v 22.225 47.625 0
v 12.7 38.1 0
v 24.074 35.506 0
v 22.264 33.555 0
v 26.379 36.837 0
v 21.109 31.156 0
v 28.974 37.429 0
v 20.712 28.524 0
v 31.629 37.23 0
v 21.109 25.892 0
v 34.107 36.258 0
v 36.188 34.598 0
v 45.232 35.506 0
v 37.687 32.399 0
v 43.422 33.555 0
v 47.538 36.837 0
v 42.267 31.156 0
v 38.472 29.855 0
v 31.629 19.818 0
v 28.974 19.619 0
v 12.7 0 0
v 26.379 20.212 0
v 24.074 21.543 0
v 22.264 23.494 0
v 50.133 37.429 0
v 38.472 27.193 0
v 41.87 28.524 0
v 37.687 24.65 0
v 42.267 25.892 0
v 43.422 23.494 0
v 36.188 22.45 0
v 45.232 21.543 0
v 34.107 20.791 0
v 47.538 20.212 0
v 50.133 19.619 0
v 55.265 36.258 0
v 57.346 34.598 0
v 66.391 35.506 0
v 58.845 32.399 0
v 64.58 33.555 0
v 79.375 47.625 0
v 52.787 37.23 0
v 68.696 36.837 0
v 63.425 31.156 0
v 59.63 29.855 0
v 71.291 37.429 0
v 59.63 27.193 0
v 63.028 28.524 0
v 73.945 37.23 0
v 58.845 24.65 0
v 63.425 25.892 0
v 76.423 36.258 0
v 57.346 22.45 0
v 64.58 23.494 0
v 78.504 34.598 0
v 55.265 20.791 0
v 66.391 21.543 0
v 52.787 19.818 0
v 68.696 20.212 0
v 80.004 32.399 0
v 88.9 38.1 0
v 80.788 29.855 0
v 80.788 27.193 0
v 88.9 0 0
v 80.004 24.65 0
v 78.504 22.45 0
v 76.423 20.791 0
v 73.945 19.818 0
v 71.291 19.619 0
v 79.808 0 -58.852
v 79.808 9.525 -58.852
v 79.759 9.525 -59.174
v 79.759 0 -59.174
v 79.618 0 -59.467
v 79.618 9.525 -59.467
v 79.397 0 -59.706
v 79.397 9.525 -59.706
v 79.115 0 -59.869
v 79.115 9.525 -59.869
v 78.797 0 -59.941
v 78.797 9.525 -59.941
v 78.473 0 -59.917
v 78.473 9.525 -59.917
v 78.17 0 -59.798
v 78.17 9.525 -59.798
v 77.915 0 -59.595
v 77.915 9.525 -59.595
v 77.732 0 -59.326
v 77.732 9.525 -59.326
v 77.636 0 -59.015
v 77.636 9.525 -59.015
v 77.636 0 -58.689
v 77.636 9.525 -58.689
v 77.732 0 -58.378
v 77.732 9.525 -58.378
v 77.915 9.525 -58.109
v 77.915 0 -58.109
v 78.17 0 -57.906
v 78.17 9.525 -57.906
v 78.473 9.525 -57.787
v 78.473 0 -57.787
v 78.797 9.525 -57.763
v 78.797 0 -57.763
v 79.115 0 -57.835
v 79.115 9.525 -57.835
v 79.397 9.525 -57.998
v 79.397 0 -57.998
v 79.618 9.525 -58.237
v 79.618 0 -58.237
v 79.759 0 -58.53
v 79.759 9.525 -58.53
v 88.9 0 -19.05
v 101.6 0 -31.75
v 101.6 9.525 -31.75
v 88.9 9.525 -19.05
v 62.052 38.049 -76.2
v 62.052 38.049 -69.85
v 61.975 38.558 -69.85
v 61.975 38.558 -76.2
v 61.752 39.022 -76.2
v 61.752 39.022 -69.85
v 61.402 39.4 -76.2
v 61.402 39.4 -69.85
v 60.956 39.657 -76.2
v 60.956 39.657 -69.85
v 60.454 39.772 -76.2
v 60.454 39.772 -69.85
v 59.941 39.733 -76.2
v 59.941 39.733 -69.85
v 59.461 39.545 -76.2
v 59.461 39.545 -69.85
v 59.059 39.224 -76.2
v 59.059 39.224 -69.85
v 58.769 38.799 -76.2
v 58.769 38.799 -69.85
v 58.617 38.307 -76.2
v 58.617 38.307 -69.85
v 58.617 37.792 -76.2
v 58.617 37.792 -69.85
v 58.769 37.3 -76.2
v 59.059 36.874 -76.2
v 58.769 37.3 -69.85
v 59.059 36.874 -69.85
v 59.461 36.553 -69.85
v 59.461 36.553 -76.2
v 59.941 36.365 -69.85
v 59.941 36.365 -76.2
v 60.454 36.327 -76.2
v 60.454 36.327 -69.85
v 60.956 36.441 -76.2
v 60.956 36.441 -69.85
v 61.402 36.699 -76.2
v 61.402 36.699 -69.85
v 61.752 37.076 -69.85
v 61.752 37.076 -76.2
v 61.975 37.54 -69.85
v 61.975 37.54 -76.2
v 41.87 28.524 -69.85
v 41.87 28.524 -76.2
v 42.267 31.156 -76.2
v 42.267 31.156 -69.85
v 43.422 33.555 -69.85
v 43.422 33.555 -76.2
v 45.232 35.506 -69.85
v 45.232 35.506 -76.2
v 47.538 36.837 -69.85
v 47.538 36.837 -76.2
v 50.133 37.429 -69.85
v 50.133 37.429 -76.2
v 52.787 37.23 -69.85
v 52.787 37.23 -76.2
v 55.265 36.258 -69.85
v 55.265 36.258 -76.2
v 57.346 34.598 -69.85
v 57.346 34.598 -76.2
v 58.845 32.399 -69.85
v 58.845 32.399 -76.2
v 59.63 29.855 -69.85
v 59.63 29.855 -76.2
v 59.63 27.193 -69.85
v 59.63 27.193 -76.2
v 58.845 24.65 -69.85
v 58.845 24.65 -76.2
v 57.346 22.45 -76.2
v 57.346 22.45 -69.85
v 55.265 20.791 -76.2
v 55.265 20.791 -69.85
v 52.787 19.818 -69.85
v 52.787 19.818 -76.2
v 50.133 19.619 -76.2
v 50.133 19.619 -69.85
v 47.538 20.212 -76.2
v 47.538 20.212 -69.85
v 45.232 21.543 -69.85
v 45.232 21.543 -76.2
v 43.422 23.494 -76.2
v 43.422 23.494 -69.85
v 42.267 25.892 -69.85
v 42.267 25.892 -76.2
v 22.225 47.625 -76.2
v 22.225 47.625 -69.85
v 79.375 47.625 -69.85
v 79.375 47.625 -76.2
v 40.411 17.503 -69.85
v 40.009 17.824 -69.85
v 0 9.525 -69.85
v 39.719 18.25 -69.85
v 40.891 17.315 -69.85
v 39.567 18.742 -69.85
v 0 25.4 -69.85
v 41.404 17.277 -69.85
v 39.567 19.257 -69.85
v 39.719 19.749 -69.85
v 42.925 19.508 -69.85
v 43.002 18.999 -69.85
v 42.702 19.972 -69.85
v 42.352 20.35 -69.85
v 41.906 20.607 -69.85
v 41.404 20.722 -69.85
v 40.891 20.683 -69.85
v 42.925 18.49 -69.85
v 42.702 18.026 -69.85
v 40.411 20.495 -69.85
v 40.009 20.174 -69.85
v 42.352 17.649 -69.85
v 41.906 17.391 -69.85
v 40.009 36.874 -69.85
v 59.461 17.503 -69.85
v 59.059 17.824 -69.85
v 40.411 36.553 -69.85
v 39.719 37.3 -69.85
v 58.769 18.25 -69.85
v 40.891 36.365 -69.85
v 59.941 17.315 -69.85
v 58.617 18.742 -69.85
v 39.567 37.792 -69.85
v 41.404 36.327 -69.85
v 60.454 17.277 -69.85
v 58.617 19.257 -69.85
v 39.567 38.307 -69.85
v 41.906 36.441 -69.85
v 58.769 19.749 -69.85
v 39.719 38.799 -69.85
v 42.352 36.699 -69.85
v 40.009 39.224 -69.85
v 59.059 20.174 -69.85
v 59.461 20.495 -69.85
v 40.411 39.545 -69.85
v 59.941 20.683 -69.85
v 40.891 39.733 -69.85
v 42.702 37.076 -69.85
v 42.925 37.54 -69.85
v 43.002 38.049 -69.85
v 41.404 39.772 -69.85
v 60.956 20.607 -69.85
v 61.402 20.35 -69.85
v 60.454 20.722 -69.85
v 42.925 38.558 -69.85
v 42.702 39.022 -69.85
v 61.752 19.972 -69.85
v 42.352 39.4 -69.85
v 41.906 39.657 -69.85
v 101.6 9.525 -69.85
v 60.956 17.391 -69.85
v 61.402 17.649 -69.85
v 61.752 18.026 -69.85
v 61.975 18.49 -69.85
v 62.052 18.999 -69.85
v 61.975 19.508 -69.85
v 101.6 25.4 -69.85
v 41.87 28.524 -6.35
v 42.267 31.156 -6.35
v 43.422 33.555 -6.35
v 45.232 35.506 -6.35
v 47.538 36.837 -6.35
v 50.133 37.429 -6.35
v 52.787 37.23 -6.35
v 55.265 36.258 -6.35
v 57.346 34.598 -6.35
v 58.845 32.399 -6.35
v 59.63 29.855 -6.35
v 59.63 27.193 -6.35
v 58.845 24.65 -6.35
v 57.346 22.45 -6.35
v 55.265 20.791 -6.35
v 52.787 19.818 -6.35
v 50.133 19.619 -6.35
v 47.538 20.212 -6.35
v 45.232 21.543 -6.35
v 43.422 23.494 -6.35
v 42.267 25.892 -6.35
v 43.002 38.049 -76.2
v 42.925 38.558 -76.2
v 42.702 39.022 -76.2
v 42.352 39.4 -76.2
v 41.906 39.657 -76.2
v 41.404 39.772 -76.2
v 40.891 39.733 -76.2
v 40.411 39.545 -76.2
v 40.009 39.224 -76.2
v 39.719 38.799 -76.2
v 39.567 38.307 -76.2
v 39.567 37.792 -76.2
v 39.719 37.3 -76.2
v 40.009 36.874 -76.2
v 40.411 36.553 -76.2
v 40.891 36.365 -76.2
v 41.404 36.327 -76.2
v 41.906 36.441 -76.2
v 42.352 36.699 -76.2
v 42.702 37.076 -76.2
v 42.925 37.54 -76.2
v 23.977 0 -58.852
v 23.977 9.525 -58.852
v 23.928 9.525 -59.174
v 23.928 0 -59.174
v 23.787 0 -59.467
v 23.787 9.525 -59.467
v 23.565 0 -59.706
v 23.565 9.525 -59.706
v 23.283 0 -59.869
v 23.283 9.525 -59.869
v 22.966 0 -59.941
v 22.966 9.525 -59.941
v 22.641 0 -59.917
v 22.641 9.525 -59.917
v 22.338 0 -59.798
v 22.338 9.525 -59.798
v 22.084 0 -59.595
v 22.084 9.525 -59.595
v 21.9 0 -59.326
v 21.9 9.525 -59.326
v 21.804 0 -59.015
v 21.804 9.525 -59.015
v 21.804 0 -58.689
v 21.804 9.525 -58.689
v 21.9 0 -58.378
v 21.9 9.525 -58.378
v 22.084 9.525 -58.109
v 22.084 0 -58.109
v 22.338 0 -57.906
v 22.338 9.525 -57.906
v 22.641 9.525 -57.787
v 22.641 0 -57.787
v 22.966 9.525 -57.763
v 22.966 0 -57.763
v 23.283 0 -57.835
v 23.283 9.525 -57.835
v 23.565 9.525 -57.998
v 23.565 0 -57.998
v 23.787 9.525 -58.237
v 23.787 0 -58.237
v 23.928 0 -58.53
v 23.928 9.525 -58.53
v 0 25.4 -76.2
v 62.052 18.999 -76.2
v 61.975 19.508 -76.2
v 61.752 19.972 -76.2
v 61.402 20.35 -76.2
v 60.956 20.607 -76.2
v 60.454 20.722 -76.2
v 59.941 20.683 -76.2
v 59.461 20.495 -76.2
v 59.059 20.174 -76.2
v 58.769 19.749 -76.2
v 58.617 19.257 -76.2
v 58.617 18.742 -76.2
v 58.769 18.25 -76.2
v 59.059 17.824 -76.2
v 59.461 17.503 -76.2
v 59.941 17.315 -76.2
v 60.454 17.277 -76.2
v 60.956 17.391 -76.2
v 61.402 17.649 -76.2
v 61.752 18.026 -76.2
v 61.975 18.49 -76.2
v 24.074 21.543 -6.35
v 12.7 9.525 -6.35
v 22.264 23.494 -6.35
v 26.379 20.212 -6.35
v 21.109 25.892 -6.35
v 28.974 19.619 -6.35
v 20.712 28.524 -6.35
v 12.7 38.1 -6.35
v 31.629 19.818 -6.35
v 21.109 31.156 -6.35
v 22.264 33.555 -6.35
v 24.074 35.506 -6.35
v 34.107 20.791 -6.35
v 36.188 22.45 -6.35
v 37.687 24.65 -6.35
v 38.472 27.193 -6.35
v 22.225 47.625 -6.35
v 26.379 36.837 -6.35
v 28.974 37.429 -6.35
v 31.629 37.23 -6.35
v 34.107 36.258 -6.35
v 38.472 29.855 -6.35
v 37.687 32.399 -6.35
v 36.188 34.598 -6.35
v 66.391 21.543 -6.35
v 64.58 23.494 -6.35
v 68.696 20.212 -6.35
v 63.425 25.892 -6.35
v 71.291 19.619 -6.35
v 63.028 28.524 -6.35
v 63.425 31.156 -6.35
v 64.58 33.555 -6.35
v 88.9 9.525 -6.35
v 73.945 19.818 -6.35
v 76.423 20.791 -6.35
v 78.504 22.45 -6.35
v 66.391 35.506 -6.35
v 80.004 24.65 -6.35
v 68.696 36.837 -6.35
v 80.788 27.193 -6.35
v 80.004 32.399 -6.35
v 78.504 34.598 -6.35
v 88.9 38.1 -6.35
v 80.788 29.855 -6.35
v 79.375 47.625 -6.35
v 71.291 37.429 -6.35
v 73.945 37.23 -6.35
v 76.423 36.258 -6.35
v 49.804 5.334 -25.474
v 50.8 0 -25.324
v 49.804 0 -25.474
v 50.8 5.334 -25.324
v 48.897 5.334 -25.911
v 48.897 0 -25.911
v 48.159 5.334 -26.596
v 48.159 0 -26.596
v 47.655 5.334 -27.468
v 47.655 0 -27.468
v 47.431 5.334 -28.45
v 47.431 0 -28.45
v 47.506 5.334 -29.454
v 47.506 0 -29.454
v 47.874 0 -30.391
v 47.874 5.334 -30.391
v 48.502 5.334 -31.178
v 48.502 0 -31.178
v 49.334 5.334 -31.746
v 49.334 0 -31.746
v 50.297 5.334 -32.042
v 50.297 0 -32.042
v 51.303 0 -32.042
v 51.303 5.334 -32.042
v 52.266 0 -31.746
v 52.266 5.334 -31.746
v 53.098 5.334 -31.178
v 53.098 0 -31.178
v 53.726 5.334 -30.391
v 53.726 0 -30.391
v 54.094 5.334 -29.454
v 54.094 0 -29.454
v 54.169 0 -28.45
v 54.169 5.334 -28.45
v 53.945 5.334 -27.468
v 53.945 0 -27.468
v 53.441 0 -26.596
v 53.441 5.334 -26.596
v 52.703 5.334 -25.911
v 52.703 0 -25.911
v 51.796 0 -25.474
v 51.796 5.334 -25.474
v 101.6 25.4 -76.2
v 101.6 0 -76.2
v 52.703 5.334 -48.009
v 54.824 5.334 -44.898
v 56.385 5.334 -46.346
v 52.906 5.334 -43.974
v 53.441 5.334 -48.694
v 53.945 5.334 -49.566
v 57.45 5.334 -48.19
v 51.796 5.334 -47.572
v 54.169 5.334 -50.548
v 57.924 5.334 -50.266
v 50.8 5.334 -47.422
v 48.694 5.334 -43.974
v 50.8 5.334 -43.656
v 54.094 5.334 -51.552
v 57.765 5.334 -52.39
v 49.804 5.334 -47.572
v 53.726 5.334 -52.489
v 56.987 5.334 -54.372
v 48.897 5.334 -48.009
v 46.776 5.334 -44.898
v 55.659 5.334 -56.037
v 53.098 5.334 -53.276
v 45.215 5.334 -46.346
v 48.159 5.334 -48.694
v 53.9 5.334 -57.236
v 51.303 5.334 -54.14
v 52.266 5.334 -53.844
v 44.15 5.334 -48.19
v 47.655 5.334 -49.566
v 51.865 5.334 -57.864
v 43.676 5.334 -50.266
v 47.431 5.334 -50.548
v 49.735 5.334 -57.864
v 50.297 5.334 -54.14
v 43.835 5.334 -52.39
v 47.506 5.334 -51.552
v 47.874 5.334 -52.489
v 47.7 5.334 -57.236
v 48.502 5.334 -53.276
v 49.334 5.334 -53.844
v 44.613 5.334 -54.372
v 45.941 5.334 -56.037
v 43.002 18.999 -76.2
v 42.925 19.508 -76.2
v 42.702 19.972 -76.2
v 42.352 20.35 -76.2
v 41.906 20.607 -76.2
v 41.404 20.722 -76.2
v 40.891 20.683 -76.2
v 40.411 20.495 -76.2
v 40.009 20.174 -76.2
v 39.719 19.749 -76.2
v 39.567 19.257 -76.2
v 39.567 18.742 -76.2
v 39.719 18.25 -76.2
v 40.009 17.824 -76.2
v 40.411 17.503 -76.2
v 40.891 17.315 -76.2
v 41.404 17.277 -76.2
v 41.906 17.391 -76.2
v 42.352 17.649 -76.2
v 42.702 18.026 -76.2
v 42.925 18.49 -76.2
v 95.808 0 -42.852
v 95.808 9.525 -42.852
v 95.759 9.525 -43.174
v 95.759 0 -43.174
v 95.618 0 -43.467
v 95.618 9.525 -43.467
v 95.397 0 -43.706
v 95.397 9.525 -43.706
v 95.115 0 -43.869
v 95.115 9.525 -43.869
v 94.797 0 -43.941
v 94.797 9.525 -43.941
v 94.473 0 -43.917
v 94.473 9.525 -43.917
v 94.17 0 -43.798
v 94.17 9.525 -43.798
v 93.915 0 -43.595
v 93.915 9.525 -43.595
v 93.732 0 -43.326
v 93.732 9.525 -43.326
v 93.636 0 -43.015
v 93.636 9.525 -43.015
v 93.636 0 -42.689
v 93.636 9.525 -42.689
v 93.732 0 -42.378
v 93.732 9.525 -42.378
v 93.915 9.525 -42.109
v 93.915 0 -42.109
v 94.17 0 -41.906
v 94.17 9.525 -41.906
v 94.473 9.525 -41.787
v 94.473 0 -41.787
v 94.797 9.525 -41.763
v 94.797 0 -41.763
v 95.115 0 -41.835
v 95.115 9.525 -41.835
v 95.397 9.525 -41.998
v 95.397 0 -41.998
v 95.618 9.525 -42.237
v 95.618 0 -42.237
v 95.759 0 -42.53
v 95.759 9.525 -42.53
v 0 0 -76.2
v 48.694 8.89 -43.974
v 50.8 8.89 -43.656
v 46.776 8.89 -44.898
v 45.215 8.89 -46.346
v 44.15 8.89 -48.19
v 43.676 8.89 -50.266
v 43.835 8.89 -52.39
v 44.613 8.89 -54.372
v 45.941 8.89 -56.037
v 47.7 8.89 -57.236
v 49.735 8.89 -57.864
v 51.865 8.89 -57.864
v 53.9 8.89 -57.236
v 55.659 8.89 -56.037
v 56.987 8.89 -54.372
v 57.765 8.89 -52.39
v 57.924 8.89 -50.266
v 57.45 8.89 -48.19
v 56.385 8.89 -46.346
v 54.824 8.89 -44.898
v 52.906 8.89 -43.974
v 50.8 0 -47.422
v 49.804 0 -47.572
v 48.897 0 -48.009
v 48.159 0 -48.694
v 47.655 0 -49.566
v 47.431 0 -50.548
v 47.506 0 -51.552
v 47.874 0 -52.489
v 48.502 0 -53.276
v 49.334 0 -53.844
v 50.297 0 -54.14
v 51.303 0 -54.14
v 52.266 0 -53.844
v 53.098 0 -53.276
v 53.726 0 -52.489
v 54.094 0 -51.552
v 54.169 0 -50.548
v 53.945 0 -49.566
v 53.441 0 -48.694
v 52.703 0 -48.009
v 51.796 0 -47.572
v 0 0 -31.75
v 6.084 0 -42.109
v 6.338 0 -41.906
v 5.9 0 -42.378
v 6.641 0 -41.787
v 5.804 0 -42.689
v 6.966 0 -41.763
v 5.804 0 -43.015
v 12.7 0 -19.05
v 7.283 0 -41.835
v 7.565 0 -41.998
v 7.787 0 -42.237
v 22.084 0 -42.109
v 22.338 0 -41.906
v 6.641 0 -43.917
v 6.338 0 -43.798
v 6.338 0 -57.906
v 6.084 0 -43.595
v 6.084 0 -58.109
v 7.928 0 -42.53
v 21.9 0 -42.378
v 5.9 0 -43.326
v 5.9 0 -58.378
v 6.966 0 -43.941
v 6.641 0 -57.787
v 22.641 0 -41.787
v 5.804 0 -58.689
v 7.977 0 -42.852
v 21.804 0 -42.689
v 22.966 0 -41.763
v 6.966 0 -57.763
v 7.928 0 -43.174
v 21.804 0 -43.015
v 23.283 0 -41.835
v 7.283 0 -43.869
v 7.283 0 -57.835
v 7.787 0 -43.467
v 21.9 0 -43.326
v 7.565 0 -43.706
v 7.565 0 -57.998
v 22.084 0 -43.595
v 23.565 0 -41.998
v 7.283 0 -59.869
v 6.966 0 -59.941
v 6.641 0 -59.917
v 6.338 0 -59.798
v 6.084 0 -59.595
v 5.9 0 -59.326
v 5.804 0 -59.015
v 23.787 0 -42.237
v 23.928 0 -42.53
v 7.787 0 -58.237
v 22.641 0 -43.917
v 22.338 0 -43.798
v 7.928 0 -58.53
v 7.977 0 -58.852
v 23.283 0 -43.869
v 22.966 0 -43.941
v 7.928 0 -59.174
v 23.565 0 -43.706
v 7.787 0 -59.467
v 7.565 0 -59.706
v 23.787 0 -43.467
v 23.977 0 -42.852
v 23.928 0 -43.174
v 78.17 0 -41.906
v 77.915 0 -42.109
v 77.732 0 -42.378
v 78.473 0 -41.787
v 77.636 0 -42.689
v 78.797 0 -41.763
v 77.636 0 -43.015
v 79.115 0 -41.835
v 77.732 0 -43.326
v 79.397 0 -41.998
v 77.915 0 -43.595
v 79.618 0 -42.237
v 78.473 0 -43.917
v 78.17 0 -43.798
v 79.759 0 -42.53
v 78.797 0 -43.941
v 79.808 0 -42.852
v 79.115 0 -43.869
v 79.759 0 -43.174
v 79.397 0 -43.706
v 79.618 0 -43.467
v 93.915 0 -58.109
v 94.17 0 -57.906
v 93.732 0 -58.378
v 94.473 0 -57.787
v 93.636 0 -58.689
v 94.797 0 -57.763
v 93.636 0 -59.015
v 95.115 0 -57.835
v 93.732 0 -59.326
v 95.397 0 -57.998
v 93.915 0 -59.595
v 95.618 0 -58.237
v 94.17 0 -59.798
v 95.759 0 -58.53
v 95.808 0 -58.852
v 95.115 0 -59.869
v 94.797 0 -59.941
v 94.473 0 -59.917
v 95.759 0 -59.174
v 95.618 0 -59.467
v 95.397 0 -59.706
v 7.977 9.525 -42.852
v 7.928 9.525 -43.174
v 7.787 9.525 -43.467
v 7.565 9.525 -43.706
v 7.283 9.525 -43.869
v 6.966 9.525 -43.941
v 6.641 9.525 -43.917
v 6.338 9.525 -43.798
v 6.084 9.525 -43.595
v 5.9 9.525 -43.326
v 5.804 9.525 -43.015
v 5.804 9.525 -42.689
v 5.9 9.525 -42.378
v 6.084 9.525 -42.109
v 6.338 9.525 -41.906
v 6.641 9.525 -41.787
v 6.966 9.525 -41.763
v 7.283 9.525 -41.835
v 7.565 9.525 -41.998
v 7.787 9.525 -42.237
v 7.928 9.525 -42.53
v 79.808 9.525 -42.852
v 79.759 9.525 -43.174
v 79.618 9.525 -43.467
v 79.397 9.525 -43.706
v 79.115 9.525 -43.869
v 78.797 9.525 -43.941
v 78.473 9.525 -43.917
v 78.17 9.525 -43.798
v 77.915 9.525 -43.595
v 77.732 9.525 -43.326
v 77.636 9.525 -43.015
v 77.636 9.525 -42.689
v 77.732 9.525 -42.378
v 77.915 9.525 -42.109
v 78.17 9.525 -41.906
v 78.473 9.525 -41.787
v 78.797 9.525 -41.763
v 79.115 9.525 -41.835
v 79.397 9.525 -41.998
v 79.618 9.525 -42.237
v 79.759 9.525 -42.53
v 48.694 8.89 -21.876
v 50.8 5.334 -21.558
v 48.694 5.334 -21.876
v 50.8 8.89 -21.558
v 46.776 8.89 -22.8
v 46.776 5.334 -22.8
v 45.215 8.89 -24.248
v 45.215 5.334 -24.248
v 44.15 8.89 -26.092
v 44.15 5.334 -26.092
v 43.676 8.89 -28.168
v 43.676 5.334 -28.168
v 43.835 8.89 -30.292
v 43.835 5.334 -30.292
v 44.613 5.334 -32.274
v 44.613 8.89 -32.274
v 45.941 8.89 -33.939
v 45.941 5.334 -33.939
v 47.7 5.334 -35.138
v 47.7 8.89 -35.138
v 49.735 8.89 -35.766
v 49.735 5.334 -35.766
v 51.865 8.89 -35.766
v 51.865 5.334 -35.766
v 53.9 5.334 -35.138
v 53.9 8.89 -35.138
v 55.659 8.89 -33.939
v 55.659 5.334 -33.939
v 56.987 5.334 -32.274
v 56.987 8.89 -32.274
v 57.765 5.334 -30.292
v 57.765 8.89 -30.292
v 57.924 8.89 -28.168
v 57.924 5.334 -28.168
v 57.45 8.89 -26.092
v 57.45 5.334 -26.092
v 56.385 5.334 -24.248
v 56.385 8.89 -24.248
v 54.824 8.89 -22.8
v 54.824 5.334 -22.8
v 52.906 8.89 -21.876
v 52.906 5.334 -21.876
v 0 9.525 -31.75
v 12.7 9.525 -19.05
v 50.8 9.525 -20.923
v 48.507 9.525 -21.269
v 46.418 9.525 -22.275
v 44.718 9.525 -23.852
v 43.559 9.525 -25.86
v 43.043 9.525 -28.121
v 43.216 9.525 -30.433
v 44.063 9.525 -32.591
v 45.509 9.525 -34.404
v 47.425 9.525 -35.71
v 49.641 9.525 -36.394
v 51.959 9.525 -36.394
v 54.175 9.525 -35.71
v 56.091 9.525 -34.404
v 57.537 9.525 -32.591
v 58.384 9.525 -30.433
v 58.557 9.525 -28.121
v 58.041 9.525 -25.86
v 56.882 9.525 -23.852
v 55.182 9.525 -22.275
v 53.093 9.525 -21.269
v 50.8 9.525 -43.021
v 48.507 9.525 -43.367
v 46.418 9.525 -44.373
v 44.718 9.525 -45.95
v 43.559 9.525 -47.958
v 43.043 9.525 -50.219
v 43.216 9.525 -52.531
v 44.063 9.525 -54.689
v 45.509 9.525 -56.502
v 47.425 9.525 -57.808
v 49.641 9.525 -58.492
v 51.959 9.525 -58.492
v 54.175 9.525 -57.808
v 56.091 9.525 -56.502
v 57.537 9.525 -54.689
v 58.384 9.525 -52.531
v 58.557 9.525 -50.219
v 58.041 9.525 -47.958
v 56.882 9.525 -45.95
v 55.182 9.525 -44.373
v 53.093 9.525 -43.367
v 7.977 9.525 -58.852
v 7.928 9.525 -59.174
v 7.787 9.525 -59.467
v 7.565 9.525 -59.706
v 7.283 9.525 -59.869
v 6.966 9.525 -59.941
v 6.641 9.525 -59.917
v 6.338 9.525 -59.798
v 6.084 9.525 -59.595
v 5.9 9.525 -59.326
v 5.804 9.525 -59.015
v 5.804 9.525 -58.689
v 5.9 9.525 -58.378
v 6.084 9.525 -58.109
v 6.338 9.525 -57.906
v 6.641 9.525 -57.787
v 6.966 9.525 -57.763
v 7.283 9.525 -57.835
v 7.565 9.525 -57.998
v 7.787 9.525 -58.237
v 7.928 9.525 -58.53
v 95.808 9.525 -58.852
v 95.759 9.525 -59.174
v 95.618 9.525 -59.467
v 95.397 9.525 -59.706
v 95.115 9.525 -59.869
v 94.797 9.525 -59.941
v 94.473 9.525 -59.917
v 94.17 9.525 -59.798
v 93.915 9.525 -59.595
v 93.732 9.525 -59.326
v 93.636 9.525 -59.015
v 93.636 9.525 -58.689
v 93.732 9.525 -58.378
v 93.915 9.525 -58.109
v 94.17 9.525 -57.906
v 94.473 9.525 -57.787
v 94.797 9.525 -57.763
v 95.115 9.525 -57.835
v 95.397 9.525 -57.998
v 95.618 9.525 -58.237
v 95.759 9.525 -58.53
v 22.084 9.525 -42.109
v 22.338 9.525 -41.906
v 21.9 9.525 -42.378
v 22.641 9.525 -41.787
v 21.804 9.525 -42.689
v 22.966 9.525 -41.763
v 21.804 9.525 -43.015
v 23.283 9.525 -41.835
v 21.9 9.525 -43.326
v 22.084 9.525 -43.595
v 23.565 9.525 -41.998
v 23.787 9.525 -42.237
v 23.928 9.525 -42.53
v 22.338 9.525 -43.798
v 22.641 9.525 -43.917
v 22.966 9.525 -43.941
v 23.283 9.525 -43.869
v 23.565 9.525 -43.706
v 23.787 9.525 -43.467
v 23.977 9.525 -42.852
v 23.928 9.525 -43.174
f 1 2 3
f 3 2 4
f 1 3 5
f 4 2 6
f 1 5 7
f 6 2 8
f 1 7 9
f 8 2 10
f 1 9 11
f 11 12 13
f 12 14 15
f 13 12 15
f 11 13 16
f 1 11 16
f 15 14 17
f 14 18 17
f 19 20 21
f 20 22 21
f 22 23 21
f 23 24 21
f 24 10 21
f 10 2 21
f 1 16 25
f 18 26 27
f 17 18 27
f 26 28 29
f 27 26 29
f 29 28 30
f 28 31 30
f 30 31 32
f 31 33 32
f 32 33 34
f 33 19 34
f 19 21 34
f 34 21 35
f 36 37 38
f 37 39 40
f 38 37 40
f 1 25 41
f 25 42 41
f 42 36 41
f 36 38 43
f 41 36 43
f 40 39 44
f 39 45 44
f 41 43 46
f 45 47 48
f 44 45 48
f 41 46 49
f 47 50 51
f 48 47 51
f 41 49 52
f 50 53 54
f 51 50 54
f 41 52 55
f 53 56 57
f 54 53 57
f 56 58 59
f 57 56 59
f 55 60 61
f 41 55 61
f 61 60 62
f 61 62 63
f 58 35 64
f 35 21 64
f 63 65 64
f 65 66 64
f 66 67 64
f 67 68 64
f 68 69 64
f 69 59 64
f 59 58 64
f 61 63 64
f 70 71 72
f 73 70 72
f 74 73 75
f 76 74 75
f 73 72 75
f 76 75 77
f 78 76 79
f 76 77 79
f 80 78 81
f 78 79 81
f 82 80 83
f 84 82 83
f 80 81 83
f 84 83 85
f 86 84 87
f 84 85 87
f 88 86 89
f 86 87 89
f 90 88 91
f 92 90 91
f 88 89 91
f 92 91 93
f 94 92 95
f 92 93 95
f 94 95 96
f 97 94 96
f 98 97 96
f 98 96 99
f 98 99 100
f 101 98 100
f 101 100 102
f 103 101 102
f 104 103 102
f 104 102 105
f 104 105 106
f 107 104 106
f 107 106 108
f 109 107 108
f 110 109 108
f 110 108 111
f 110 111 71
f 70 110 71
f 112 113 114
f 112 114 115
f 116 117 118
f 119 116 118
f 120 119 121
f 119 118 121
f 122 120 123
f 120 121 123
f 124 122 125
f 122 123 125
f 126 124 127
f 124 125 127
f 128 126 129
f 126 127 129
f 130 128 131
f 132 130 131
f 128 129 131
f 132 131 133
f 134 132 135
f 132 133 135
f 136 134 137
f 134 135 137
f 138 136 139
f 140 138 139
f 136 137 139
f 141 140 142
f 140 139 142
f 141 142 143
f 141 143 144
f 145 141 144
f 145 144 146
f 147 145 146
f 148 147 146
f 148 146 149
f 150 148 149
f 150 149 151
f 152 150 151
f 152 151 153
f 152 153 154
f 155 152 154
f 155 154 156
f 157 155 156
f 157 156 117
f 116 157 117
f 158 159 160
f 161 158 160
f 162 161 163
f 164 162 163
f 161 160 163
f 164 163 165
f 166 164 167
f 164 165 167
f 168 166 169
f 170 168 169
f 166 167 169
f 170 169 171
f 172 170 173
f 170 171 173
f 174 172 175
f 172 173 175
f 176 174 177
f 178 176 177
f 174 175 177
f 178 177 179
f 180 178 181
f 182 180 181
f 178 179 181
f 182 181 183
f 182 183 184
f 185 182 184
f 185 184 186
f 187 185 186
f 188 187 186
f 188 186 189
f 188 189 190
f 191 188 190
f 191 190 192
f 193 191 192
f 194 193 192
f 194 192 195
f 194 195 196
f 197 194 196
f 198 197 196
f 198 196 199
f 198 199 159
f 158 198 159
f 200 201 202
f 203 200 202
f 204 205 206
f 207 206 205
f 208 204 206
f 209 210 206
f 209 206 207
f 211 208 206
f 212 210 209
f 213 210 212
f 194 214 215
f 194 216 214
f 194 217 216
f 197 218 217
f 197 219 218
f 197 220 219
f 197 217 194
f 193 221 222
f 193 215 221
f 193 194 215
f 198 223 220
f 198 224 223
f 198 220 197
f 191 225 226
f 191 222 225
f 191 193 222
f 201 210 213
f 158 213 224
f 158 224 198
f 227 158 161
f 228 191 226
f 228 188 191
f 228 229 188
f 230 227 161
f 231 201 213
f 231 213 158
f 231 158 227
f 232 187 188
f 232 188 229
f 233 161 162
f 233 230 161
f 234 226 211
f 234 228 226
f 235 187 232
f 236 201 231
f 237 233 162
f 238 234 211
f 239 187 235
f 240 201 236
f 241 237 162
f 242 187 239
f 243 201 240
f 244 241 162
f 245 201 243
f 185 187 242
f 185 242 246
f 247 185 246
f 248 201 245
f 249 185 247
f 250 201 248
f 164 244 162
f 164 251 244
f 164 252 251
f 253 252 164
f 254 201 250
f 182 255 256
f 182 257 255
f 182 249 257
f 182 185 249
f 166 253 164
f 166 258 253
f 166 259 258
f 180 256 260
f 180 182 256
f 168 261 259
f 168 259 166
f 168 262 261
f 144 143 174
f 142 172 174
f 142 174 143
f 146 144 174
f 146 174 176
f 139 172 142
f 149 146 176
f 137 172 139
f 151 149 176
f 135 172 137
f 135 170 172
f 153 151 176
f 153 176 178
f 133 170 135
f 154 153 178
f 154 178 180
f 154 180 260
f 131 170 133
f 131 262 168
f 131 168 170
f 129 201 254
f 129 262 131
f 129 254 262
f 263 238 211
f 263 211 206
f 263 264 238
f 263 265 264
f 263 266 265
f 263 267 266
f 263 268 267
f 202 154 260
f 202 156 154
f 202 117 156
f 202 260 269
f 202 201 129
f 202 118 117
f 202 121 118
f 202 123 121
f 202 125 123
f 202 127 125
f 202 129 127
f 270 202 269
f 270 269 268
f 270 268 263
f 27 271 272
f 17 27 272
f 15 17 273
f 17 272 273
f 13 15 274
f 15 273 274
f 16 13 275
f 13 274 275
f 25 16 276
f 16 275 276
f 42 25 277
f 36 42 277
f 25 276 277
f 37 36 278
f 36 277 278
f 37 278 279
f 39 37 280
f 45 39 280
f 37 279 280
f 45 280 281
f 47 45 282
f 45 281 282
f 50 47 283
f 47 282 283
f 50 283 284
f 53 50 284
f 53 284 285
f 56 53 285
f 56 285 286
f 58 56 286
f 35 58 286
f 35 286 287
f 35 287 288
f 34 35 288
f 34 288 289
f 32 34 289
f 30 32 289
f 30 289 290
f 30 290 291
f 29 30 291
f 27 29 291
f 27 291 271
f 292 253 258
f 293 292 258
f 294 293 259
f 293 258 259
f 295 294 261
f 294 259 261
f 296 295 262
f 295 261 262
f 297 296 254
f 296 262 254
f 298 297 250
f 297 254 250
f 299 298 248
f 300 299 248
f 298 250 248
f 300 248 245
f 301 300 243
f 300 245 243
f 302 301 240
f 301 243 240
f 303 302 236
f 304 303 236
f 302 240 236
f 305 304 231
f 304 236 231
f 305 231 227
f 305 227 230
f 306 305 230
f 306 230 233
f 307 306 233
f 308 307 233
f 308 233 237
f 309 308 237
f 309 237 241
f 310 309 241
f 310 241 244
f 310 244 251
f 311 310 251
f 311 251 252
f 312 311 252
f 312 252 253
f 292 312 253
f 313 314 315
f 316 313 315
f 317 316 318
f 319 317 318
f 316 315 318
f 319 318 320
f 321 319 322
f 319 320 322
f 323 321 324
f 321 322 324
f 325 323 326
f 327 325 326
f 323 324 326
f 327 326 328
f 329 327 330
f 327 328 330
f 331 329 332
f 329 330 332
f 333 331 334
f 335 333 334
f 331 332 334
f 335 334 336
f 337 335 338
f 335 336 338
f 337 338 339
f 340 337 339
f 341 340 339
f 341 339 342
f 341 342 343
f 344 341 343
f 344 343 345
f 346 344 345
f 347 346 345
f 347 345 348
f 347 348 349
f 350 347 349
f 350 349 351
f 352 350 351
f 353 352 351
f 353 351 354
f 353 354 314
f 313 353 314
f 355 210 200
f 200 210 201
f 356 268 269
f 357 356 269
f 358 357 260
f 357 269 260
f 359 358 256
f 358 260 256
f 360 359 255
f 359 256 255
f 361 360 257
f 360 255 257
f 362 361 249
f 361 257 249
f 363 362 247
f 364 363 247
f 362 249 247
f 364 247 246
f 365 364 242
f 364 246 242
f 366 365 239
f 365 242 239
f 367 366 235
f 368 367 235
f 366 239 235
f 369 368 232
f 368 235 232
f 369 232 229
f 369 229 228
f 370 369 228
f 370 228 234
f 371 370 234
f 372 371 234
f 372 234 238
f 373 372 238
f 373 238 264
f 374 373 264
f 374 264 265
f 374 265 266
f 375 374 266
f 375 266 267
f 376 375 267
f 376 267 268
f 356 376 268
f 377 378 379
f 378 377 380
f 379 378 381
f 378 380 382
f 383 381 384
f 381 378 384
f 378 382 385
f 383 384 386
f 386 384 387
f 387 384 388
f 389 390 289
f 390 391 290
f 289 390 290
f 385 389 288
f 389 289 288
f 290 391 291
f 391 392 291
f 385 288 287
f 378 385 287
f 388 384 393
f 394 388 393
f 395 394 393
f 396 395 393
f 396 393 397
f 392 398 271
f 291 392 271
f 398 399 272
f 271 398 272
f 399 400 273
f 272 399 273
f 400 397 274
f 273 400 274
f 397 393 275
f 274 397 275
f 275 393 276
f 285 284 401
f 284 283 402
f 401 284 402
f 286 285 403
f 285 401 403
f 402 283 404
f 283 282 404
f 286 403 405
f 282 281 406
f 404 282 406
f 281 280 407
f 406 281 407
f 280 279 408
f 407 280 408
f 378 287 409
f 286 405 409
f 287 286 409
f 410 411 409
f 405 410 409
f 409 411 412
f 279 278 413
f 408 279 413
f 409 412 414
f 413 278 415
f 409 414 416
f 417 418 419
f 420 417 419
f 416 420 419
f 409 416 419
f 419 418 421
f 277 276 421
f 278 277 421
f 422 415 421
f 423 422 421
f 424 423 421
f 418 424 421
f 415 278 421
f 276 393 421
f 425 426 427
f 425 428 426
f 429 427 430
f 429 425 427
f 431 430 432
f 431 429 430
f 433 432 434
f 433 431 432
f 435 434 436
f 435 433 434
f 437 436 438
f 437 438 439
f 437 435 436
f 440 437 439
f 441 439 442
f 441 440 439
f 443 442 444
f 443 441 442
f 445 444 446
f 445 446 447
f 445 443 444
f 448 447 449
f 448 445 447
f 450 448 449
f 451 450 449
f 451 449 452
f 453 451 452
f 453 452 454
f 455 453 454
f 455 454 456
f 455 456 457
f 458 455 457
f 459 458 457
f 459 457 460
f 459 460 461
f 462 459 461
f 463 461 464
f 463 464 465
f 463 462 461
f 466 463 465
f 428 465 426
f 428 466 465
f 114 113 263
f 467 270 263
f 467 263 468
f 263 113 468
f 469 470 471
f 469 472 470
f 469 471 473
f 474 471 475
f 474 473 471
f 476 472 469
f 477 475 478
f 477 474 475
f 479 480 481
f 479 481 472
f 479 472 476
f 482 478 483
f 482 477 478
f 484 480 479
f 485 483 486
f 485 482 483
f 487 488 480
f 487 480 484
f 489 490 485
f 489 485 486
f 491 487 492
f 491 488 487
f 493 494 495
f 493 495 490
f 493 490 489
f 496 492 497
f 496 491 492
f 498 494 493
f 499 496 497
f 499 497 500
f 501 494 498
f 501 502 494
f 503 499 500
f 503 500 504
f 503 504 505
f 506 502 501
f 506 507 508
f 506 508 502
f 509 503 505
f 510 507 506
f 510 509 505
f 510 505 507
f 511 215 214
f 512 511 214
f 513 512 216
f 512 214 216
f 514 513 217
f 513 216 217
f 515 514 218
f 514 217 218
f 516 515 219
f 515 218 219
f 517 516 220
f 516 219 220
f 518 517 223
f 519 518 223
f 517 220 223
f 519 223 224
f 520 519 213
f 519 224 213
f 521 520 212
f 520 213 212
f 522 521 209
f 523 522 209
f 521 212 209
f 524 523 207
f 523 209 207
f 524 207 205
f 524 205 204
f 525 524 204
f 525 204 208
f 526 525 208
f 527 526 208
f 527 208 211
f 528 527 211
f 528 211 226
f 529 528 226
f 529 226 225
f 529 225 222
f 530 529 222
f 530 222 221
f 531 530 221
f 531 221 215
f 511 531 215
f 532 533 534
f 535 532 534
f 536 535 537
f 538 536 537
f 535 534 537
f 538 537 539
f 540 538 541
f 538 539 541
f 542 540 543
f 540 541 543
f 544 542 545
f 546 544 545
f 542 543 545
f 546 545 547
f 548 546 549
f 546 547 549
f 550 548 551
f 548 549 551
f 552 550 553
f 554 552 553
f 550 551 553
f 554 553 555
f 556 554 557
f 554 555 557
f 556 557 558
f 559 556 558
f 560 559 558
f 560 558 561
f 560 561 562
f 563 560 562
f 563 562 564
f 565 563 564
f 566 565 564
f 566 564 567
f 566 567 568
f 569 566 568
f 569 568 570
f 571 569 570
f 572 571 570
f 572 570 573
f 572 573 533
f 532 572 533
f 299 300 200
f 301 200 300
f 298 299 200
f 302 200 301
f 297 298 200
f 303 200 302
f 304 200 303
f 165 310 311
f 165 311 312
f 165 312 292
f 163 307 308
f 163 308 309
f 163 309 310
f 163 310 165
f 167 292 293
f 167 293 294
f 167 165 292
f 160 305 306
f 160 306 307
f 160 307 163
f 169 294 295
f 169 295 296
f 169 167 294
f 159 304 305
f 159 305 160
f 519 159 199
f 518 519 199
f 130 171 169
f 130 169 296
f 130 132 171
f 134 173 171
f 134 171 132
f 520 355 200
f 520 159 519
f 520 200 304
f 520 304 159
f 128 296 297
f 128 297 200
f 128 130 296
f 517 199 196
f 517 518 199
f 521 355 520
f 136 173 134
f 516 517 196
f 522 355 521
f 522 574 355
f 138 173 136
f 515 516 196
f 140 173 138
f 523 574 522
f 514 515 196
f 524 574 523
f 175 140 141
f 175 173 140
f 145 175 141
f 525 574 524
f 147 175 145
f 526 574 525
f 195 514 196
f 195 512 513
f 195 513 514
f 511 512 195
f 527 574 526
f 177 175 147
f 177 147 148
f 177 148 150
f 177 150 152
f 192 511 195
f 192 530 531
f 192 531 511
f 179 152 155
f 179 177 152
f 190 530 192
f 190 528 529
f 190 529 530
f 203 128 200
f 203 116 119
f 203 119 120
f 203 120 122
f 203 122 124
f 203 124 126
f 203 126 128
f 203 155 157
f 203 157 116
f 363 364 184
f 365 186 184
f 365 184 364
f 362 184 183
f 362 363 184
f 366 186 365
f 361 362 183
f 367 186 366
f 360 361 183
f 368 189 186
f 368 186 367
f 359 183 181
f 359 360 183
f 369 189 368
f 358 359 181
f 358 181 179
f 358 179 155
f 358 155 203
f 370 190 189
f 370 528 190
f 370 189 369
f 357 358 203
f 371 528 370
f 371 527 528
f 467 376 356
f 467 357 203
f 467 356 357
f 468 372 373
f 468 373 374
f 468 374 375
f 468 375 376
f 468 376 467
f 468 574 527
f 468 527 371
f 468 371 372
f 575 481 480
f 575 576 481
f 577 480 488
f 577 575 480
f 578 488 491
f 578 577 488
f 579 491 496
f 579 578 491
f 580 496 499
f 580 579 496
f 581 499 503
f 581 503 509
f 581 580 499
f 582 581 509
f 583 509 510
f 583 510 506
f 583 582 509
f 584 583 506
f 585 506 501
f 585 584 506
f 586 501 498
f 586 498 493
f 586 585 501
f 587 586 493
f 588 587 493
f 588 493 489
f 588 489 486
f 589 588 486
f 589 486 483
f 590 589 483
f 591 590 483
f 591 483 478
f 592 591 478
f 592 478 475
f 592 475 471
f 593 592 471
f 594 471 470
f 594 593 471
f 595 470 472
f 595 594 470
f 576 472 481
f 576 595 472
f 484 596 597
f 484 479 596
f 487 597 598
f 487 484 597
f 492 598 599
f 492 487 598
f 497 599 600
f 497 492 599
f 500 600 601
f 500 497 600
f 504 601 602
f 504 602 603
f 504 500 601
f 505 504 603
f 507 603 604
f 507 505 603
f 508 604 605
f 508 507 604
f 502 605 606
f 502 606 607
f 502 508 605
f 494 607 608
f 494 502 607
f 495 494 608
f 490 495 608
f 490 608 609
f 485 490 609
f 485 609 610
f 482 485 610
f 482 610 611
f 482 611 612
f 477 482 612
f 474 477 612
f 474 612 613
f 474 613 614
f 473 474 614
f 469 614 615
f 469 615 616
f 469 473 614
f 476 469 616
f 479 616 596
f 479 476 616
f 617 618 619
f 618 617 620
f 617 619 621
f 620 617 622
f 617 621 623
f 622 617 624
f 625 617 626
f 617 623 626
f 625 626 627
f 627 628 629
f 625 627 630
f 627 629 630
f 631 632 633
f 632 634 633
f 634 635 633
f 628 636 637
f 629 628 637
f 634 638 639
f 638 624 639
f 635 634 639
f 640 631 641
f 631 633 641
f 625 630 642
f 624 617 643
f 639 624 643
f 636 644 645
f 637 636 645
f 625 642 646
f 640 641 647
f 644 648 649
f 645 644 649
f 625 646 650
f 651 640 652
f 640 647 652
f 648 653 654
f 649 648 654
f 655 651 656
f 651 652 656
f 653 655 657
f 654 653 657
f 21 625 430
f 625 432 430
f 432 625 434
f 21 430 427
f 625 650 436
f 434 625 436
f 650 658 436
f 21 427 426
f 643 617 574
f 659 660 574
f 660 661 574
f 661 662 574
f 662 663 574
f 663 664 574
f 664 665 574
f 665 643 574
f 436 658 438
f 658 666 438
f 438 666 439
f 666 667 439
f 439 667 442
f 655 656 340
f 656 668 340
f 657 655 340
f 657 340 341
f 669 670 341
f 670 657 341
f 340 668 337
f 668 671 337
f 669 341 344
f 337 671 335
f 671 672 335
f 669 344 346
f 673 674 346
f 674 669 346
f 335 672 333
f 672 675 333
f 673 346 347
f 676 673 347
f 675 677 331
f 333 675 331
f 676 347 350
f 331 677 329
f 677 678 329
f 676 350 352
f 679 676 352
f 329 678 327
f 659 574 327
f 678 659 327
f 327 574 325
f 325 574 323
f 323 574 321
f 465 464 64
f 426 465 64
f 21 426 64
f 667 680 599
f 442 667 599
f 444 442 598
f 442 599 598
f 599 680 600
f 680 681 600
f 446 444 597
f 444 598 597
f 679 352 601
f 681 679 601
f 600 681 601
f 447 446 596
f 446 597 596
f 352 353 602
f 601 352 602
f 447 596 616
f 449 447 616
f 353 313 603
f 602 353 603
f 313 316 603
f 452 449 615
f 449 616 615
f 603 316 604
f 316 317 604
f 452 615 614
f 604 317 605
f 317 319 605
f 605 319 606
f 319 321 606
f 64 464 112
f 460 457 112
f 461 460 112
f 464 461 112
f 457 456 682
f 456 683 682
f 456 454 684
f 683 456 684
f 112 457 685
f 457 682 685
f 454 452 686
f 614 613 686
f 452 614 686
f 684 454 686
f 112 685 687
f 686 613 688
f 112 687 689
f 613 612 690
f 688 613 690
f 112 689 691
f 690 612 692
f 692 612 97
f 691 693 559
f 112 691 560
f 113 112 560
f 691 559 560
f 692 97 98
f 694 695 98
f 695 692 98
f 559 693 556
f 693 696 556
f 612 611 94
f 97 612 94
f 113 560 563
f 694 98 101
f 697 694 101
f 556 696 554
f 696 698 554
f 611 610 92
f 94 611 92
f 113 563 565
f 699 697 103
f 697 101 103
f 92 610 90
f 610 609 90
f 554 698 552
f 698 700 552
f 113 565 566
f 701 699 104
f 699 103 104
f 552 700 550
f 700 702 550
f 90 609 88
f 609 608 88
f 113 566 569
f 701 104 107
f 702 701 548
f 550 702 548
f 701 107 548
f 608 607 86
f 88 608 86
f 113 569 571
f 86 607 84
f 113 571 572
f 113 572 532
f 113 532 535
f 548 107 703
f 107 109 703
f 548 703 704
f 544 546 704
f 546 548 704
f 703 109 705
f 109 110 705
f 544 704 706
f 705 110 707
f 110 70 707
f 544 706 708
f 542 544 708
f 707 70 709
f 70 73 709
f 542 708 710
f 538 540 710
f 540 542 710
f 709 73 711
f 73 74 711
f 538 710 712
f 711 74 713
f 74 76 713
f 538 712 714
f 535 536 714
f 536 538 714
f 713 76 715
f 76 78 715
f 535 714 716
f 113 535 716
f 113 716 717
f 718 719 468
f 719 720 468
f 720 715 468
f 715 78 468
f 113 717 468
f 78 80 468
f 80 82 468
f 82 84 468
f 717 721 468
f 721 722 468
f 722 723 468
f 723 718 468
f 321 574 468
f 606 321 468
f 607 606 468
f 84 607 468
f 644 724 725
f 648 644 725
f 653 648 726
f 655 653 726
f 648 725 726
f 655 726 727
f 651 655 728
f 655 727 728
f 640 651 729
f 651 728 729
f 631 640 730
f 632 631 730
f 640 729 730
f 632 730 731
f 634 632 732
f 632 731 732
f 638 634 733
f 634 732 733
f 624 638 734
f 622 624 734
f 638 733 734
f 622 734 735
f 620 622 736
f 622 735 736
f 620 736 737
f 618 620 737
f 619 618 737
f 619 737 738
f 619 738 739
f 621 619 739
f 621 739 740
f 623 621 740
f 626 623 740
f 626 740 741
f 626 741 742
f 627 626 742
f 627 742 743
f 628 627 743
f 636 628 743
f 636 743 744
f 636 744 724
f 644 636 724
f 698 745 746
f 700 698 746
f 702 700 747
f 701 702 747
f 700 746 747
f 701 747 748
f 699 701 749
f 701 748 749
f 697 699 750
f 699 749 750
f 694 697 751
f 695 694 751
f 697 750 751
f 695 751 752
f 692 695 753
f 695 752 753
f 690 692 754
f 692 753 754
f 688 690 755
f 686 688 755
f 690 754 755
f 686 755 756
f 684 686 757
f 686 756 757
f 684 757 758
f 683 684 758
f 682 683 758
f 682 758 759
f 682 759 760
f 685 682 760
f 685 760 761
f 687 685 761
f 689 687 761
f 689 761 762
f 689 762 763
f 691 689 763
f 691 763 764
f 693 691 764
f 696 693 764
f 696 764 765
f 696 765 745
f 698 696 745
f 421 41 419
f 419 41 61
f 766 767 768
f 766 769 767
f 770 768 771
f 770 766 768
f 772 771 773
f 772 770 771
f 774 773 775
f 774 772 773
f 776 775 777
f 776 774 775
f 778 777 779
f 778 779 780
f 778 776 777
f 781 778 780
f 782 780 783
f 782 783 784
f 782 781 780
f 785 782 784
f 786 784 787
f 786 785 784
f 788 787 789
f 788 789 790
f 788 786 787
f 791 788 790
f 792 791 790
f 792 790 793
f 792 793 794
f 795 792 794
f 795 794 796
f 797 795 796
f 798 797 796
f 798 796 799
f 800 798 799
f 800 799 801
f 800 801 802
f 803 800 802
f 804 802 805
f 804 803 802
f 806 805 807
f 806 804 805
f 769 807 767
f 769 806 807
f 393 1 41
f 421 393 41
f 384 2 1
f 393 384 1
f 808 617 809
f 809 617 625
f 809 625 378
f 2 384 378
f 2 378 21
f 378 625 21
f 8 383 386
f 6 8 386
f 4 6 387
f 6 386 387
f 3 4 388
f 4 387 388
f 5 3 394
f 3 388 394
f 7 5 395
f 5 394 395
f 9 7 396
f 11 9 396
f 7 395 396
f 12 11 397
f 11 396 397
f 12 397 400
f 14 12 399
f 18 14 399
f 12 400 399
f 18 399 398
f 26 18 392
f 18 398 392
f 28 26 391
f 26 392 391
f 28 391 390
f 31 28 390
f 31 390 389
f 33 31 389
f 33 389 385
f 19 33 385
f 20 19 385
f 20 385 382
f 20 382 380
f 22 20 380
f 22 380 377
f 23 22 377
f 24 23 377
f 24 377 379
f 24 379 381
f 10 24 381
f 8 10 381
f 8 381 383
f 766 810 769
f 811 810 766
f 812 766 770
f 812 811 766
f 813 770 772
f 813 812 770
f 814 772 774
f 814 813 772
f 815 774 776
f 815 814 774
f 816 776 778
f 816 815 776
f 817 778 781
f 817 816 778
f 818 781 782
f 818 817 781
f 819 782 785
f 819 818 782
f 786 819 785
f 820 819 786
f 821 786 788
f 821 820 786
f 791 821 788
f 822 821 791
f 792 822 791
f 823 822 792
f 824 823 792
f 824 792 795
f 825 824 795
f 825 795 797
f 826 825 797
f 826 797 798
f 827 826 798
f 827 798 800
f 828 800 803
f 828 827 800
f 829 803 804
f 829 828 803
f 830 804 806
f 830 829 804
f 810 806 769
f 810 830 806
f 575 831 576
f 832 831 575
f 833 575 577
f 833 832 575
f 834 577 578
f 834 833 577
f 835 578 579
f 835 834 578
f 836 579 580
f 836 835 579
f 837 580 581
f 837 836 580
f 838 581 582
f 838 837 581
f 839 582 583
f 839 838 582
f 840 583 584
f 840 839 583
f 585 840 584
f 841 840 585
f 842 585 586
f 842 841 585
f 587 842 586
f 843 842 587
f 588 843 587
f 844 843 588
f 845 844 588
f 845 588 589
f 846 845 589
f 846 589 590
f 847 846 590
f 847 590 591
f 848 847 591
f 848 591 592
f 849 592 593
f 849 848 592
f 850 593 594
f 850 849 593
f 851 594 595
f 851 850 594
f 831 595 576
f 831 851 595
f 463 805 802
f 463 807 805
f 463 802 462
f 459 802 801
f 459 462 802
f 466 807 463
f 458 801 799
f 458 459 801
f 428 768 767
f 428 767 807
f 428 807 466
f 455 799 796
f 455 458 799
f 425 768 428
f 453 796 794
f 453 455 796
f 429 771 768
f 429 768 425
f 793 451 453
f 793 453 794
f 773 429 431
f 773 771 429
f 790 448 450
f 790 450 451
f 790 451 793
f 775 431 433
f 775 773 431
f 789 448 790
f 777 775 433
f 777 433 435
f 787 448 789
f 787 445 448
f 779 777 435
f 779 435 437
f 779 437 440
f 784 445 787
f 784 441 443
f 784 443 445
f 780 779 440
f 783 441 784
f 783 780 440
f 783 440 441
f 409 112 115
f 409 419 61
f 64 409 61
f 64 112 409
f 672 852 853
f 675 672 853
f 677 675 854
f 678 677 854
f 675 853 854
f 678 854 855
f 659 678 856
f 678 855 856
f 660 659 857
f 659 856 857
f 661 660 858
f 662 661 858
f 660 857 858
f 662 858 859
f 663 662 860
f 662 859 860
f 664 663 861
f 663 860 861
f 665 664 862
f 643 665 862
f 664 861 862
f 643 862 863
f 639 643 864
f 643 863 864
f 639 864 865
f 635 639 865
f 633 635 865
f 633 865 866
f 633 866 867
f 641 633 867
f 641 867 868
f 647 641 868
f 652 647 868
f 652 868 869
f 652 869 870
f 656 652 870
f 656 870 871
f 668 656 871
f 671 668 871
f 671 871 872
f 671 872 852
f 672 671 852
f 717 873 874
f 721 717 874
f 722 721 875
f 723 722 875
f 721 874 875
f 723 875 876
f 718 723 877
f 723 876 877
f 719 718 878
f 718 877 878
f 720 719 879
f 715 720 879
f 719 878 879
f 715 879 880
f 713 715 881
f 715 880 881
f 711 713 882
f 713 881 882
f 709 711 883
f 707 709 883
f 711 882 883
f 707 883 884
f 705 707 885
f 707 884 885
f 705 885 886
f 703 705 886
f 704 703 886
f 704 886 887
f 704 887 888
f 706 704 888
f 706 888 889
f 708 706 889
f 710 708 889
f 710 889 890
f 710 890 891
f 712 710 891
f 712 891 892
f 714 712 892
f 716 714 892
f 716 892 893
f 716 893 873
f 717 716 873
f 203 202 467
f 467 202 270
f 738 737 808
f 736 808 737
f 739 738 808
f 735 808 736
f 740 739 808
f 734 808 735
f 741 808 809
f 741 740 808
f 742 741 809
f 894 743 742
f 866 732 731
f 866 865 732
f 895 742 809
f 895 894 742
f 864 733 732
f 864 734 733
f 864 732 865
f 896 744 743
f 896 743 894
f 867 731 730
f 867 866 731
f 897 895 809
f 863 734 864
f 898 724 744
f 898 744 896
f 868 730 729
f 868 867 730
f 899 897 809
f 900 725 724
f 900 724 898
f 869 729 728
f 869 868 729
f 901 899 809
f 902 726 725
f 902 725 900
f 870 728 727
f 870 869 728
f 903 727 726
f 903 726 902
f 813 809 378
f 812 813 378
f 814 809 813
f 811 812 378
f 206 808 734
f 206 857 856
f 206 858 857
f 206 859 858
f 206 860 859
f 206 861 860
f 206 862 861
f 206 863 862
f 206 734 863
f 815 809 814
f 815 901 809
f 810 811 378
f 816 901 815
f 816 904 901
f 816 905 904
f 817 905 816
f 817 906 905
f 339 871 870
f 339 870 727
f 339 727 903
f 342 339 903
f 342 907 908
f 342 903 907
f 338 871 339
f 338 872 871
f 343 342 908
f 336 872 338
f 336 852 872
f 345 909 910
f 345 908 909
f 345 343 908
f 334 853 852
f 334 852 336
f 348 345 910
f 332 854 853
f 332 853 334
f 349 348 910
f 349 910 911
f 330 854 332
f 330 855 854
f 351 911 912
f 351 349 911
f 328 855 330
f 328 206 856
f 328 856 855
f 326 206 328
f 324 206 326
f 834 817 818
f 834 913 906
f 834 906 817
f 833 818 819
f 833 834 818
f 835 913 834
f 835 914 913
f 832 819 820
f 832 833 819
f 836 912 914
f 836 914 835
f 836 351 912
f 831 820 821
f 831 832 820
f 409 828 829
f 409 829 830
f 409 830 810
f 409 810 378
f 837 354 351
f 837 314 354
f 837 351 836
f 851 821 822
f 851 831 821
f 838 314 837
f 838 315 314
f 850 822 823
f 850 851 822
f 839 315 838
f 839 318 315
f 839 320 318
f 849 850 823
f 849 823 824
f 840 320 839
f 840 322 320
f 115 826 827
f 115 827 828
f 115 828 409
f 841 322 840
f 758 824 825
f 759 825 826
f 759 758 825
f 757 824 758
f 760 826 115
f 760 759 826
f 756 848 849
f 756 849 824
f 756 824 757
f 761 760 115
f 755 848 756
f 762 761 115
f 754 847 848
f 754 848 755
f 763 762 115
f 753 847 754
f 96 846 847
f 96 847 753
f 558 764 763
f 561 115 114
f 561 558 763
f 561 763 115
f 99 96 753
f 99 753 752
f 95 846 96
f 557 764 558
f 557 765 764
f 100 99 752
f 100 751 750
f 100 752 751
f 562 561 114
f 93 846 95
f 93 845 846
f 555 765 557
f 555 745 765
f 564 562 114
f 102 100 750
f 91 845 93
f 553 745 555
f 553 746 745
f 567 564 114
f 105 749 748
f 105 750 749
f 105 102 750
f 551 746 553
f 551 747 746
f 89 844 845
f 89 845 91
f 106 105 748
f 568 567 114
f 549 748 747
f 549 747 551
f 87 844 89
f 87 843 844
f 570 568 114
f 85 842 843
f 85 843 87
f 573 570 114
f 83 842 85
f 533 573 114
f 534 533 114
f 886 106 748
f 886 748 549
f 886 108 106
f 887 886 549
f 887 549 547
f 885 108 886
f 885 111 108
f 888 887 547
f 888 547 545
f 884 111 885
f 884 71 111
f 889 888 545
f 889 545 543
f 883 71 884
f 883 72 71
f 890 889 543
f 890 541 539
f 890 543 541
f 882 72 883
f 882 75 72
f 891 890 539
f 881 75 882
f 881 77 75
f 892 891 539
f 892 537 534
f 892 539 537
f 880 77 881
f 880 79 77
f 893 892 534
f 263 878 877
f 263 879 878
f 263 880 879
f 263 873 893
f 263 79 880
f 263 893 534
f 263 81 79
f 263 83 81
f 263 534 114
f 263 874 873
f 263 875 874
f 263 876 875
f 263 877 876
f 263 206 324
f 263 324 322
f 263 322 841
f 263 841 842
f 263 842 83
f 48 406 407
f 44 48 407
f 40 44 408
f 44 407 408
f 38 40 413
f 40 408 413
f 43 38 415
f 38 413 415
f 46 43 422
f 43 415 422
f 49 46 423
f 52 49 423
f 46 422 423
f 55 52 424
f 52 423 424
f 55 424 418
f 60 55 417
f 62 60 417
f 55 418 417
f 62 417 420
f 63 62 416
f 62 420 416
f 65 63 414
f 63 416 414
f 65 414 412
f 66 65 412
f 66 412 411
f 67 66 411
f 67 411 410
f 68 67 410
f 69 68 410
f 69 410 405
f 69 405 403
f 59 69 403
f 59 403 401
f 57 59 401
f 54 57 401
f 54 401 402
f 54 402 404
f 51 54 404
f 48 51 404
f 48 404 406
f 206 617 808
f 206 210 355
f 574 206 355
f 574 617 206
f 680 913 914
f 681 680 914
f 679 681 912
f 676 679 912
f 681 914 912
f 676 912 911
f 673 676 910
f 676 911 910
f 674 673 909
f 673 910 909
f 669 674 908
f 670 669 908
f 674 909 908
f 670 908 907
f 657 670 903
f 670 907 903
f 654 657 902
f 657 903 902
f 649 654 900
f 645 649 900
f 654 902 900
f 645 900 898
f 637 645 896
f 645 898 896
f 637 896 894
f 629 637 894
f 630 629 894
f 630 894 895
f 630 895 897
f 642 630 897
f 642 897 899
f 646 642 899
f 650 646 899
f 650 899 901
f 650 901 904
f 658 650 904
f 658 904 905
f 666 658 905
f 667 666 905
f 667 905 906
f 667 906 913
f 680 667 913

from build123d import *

# Parameters (mm, degrees)
SKETCH1_W                                    = 101.6
SKETCH1_H                                    = 76.2
BOSS_EXTRUDE1_DEPTH                          = 50.8
CUT_EXTRUDE1_DEPTH                           = 31.75
CUT_EXTRUDE1_DEPTH_BACK                      = 31.75
SKETCH9_W                                    = 101.6
SKETCH9_H                                    = 41.275
F_45_64_0_70313_DIAMETER_HOLE1_D             = 17.859502
F_45_64_0_70313_DIAMETER_HOLE2_D             = 17.859502
F_45_64_0_70313_DIAMETER_HOLE2_DEPTH         = 25.4
F_45_64_0_70313_DIAMETER_HOLE2_TIP           = 5.365535714
CBORE_FOR_1_4_BINDING_HEAD_MACHINE_S_2_COUNT = 2
CBORE_FOR_1_4_BINDING_HEAD_MACHINE_S_2_PITCH = 22.098
CUT_EXTRUDE3_DEPTH                           = 137.783186101
F_8_32_TAPPED_HOLE1_D                        = 3.4544
F_8_32_TAPPED_HOLE1_DEPTH                    = 6.35
CUT_EXTRUDE4_DEPTH                           = 136.636059457
F_44_0_086_DIAMETER_HOLE1_D                  = 2.1844


with BuildPart() as part:
    # Sketch1 → Boss-Extrude1 (new body)
    with BuildSketch(Plane(origin=(0, 0, 0), x_dir=(1, 0, 0), z_dir=(0, 1, 0))):
        with Locations((50.8, 38.1)):
            Rectangle(SKETCH1_W, SKETCH1_H)
    extrude(amount=BOSS_EXTRUDE1_DEPTH)

    # Sketch9 → Cut-Extrude1 (cut, two sides: drawn at the far end of the back side and taken through both)
    with BuildSketch(Plane.XY.offset(-38.1).offset(-CUT_EXTRUDE1_DEPTH_BACK)):
        with Locations((50.8, 30.1625)):
            Rectangle(SKETCH9_W, SKETCH9_H)
    extrude(amount=CUT_EXTRUDE1_DEPTH + CUT_EXTRUDE1_DEPTH_BACK, mode=Mode.SUBTRACT)

    # 45/64 (0.70313) Diameter Hole1 (through all)
    with Locations(Plane.XY):
        with Locations((50.8, 28.5242)):
            Hole(F_45_64_0_70313_DIAMETER_HOLE1_D / 2)

    # 45/64 (0.70313) Diameter Hole2
    with Locations(Plane.XY):
        with Locations((29.6418, 28.5242), (71.9582, 28.5242)):
            Hole(F_45_64_0_70313_DIAMETER_HOLE2_D / 2, depth=F_45_64_0_70313_DIAMETER_HOLE2_DEPTH)
            with Locations((0, 0, -(F_45_64_0_70313_DIAMETER_HOLE2_DEPTH + F_45_64_0_70313_DIAMETER_HOLE2_TIP / 2))):  # 118° drill point
                Cone(0, F_45_64_0_70313_DIAMETER_HOLE2_D / 2, F_45_64_0_70313_DIAMETER_HOLE2_TIP, mode=Mode.SUBTRACT)

    # Sketch14 → CBORE for 1/4 Binding Head Machine Screw1 (revolve, cut)
    with BuildSketch(Plane(origin=(50.8, 9.525, -50.8), x_dir=(0, 0, 1), z_dir=(1, 0, 0))):
        Polygon((0, 0), (0, 9.525), (3.3782, 9.525), (3.3782, 4.191), (7.14375, 4.191), (7.14375, 0.635), (7.77875, 0), align=None)
    cbore_for_1_4_binding_head_machine_screw = revolve(axis=Axis((50.8, 15.875, -50.8), (0, -1, 0)), mode=Mode.SUBTRACT)

    # CBORE for 1_4 Binding Head Machine S 2: CBORE for 1/4 Binding Head Machine Screw1 ×2
    with Locations(*[(0, 0, i * CBORE_FOR_1_4_BINDING_HEAD_MACHINE_S_2_PITCH) for i in range(1, CBORE_FOR_1_4_BINDING_HEAD_MACHINE_S_2_COUNT)]):
        add(cbore_for_1_4_binding_head_machine_screw, mode=Mode.SUBTRACT)

    # Sketch17 → Cut-Extrude3 (cut, through all)
    with BuildSketch(Plane.XY):
        Polygon((0, 25.4), (22.225, 47.625), (79.375, 47.625), (101.6, 25.4), (101.6, 50.8), (0, 50.8), align=None)
    extrude(amount=-CUT_EXTRUDE3_DEPTH, mode=Mode.SUBTRACT)

    # #8-32 Tapped Hole1
    with Locations(Plane(origin=(0, 0, -76.2), x_dir=(-1, 0, 0), z_dir=(0, 0, -1))):
        with Locations((-41.275, 38.0492), (-60.325, 18.9992), (-60.325, 38.0492), (-41.275, 18.9992)):
            Hole(F_8_32_TAPPED_HOLE1_D / 2, depth=F_8_32_TAPPED_HOLE1_DEPTH)

    # Sketch21 → Cut-Extrude4 (cut, through all)
    with BuildSketch(Plane.XZ):
        Polygon((0, 0), (0, -31.75), (12.7, -19.05), (12.7, 0), align=None)
        Polygon((88.9, 0), (101.6, 0), (101.6, -31.75), (88.9, -19.05), align=None)
    extrude(amount=-CUT_EXTRUDE4_DEPTH, mode=Mode.SUBTRACT)

    # #44 (0.086) Diameter Hole1 (through all)
    with Locations(Plane(origin=(0, 0, 0), x_dir=(-1, 0, 0), z_dir=(0, -1, 0))):
        with Locations((-22.8844, 58.8518), (-6.8844, 58.8518), (-22.8844, 42.8518), (-6.8844, 42.8518), (-78.7156, 58.8518), (-94.7156, 58.8518), (-78.7156, 42.8518), (-94.7156, 42.8518)):
            Hole(F_44_0_086_DIAMETER_HOLE1_D / 2)


solid = part.part
